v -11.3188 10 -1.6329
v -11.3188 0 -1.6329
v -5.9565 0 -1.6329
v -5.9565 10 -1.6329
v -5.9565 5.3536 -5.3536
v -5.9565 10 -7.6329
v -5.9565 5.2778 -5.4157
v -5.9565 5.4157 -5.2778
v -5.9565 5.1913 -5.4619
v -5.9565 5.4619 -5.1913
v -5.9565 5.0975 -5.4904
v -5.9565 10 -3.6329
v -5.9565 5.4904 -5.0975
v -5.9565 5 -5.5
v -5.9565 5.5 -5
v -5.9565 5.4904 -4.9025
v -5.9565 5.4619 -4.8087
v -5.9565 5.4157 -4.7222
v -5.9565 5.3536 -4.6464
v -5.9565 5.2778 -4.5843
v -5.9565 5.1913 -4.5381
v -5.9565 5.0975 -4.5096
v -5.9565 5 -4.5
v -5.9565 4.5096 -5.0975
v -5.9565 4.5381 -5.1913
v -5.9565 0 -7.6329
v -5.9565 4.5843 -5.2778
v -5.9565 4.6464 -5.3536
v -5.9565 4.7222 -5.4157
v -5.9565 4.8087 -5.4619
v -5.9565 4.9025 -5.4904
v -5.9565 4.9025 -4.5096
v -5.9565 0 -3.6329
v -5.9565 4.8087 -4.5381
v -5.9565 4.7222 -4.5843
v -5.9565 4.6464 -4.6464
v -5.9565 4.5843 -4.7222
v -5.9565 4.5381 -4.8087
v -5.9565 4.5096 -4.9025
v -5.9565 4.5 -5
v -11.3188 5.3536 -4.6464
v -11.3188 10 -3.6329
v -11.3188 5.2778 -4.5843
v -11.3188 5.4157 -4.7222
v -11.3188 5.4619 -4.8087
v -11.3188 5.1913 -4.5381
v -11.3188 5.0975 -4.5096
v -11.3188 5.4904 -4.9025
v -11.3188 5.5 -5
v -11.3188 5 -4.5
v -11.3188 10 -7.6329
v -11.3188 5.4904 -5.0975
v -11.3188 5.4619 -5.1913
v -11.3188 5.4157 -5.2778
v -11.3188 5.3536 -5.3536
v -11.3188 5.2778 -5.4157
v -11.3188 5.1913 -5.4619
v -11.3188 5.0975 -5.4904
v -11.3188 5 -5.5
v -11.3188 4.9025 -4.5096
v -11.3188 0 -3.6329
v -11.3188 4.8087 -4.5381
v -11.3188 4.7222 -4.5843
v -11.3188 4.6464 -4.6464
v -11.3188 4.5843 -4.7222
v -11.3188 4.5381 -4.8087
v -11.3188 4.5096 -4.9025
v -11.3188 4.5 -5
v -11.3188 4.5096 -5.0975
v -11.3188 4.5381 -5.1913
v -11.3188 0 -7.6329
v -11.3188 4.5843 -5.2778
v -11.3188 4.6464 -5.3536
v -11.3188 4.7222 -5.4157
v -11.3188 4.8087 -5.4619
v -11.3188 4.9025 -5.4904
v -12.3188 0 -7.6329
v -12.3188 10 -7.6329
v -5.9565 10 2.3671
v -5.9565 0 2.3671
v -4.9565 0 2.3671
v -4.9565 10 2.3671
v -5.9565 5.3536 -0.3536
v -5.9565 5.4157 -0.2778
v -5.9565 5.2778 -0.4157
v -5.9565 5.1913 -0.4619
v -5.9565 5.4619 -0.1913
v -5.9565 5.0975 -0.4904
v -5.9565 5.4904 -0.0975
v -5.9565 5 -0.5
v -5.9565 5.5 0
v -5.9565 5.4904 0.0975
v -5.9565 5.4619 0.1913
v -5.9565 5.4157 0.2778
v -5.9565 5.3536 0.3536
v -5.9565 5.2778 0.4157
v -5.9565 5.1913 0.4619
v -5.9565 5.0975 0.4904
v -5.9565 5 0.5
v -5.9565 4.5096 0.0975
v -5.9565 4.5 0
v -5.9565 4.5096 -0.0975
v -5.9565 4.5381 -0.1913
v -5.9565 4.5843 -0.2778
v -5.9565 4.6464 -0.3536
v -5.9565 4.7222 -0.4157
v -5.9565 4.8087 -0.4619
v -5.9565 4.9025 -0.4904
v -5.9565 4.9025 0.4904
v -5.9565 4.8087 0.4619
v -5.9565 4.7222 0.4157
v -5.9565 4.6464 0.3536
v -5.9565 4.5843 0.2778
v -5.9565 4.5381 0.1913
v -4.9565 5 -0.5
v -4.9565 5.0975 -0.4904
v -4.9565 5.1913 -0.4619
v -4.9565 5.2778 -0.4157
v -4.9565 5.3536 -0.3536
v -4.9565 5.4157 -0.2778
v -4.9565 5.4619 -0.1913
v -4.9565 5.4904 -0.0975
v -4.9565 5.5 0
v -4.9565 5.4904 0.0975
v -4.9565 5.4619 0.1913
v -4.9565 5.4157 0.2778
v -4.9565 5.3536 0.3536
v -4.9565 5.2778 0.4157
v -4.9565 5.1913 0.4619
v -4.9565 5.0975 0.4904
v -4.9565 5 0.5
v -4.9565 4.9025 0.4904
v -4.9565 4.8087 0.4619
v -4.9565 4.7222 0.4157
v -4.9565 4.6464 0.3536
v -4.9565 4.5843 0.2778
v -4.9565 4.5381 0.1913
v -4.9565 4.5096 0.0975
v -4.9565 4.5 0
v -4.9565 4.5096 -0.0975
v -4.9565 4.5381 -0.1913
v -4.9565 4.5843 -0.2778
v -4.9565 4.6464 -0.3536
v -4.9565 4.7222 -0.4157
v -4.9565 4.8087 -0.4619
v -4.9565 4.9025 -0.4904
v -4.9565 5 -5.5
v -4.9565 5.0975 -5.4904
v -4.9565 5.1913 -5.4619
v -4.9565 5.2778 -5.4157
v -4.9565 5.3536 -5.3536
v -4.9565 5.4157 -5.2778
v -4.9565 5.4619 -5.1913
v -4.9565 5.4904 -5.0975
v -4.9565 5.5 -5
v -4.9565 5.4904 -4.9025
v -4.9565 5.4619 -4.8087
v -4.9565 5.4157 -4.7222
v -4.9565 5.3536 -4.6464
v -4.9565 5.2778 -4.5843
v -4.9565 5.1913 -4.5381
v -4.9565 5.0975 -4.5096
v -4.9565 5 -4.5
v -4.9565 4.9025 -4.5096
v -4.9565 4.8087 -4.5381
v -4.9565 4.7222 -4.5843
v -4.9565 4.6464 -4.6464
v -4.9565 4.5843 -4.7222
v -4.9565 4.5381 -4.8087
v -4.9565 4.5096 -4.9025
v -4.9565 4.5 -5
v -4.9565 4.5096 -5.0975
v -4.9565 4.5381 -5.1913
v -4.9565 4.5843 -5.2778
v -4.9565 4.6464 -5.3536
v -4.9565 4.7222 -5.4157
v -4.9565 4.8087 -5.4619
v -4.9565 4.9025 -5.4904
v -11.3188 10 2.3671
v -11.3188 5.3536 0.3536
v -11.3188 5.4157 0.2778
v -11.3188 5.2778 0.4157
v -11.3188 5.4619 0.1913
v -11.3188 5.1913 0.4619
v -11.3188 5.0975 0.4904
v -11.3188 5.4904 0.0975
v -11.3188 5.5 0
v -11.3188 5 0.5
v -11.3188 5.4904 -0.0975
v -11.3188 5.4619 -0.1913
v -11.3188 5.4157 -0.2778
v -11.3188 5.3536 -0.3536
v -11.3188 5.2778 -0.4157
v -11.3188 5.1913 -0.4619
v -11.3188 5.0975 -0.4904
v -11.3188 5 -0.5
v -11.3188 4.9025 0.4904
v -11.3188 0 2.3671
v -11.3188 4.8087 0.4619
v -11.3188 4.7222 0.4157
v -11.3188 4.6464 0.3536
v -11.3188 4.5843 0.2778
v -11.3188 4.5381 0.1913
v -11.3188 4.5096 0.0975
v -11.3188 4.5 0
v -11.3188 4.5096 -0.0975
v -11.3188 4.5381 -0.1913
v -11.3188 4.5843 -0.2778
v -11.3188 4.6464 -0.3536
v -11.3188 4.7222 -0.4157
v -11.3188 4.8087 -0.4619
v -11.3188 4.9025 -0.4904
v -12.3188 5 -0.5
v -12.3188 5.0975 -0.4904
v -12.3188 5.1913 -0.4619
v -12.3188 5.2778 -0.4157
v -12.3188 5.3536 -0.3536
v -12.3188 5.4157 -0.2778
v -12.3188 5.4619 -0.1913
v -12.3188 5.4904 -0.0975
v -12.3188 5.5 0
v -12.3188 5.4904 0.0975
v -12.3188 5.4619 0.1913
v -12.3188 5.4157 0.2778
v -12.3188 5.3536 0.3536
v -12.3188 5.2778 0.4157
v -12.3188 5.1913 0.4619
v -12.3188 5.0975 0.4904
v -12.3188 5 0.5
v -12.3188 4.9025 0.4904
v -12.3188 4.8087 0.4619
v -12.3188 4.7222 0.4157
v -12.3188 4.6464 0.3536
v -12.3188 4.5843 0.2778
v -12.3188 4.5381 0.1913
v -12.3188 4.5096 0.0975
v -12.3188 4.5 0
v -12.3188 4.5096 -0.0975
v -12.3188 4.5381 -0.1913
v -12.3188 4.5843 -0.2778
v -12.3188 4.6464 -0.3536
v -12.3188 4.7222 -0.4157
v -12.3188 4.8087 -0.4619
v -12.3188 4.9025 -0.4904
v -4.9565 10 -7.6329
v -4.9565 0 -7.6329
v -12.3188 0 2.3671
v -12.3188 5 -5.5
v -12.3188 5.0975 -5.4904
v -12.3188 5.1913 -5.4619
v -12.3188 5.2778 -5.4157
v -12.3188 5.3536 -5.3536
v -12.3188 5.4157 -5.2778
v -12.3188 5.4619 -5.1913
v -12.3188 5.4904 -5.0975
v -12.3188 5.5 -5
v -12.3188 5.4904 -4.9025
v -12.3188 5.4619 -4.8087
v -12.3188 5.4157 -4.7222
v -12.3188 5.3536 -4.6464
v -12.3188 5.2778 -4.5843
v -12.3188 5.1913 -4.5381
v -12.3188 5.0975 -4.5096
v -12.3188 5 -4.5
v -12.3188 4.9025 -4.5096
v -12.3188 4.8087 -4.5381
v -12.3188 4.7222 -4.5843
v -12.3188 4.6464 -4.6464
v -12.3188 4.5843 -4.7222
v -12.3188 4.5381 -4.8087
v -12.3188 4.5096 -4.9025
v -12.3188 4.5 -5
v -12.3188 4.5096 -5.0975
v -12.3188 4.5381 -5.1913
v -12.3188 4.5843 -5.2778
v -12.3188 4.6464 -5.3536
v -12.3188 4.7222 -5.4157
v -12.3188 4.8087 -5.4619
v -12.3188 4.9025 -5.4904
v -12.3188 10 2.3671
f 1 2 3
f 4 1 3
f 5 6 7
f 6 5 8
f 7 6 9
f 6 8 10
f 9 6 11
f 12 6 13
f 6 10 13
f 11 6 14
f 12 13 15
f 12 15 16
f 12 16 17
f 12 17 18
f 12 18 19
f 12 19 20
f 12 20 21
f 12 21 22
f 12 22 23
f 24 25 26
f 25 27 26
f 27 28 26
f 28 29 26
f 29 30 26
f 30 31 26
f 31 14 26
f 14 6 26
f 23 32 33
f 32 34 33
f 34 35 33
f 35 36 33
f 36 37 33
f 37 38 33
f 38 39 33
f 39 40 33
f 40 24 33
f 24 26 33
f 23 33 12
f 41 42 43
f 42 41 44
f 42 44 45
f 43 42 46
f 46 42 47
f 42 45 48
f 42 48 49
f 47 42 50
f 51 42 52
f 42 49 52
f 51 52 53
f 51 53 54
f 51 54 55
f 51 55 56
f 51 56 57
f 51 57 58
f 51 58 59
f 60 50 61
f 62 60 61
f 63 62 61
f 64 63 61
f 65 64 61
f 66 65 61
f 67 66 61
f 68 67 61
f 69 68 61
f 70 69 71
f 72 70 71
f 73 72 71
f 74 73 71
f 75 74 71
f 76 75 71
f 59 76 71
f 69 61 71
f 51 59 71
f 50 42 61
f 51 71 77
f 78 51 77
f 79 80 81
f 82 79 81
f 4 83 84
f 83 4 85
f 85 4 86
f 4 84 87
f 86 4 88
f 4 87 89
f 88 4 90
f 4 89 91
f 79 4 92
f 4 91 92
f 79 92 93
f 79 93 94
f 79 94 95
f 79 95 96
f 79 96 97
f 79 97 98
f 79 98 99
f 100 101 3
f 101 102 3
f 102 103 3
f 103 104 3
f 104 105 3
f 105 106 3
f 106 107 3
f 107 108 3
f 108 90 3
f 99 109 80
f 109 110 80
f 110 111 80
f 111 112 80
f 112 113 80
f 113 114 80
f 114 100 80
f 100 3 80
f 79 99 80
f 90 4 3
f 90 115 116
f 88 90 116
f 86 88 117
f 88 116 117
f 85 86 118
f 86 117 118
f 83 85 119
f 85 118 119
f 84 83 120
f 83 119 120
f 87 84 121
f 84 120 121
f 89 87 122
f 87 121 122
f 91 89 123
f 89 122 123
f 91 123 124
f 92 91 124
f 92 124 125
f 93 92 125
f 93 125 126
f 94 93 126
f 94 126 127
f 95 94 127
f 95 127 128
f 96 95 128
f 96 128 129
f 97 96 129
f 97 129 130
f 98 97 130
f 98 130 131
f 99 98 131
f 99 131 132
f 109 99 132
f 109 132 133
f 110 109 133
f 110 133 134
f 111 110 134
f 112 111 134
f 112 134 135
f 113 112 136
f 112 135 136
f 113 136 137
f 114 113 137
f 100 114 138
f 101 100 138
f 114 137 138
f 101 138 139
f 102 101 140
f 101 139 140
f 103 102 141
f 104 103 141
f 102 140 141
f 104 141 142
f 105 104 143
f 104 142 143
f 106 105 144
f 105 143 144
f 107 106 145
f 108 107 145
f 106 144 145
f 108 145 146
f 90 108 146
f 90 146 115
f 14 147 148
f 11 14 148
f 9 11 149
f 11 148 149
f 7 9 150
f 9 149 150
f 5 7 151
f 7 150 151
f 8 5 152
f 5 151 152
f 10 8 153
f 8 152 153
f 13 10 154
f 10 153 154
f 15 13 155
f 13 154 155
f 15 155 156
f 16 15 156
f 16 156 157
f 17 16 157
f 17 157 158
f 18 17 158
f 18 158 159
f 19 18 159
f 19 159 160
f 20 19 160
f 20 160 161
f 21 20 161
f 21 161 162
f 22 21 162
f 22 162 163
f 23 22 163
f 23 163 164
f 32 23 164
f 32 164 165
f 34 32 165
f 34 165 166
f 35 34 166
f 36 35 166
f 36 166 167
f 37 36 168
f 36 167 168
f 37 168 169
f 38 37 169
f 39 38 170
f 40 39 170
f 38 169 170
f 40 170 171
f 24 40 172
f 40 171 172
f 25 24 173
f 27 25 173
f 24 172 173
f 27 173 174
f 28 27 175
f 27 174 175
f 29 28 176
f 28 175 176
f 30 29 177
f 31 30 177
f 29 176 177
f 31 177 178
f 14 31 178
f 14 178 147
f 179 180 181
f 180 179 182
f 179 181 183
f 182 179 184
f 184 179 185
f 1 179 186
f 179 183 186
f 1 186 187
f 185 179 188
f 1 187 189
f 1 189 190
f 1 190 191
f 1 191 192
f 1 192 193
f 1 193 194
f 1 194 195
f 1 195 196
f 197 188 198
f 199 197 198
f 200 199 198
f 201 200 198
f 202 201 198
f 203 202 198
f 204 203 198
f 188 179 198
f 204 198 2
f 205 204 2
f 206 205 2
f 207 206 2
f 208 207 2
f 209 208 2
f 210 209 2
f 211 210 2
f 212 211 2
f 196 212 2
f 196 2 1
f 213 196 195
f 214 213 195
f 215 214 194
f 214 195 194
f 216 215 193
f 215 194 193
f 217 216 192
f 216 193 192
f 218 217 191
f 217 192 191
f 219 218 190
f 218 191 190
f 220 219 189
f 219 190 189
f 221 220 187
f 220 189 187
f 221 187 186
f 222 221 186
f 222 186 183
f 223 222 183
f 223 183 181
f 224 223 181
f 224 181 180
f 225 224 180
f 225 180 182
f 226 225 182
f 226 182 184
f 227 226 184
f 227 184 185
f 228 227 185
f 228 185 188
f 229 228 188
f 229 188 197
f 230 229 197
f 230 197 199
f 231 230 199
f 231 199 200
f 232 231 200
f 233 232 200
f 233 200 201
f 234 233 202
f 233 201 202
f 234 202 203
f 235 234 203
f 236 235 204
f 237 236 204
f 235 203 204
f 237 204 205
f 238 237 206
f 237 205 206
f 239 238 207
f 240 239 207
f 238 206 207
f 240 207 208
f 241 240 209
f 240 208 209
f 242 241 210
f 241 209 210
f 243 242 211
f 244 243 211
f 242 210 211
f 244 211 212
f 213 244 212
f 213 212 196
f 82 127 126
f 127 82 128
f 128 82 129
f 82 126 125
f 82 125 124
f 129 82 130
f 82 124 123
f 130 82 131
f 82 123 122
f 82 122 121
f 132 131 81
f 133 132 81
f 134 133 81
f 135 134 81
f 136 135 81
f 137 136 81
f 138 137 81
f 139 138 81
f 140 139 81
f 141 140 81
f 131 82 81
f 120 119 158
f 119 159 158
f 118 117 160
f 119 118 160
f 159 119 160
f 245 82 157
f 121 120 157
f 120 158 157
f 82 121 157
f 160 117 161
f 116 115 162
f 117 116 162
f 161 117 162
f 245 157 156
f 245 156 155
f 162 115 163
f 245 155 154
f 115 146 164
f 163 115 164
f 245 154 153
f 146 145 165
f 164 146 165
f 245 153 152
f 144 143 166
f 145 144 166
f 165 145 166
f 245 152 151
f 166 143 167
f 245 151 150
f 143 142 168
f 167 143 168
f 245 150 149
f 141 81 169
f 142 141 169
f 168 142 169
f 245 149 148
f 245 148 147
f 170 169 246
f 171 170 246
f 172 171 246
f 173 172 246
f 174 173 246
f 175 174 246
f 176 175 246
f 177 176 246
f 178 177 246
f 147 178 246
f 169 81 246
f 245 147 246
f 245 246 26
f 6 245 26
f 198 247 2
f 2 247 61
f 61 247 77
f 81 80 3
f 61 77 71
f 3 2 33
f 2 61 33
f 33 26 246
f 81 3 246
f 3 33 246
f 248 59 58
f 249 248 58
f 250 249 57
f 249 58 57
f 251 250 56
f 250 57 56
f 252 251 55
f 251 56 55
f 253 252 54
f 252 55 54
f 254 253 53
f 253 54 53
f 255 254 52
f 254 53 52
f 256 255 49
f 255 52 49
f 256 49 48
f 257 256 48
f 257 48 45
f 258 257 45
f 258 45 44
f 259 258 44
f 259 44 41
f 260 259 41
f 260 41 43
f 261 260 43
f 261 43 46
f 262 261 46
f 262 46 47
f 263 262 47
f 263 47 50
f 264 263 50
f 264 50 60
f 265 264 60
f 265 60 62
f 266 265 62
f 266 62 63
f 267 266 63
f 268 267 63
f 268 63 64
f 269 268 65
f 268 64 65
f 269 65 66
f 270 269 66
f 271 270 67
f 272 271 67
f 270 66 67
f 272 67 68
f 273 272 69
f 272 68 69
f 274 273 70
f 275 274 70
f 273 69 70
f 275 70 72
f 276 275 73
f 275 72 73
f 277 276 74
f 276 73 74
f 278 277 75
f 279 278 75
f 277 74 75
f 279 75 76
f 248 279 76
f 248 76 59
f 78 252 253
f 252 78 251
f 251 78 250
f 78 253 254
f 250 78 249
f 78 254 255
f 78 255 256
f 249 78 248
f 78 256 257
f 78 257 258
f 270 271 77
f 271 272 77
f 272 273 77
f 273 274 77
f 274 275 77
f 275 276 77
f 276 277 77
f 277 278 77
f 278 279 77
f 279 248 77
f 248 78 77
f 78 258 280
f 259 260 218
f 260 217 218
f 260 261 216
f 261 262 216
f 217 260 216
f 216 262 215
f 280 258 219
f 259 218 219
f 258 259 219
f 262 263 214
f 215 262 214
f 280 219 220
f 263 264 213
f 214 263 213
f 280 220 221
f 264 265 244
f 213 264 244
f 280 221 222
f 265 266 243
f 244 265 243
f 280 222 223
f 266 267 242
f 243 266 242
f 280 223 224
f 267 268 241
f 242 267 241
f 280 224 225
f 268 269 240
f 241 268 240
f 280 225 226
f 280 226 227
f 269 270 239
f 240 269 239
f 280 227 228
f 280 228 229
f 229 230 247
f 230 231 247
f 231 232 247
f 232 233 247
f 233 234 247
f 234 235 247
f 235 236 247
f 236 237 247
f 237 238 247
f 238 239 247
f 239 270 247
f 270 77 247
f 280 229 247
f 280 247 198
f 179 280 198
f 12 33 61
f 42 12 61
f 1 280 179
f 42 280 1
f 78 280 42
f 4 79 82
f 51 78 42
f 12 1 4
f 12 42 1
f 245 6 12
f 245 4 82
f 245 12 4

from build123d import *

# Parameters (mm, degrees)
BOSS_EXTRUDE2_DEPTH = 10
SKETCH2_R           = 0.5
CUT_EXTRUDE1_DEPTH  = 15.57614975
LPATTERN1_COUNT     = 2
LPATTERN1_PITCH     = 5


with BuildPart() as part:
    # Sketch1 → Boss-Extrude2 (new body)
    with BuildSketch(Plane(origin=(0, 0, 0), x_dir=(1, 0, 0), z_dir=(0, 1, 0))):
        Polygon((-12.31884058, 7.632850242), (-12.31884058, -2.367149758), (-11.31884058, -2.367149758), (-11.31884058, 1.632850242), (-5.956521739, 1.632850242), (-5.956521739, -2.367149758), (-4.956521739, -2.367149758), (-4.956521739, 7.632850242), (-5.956521739, 7.632850242), (-5.956521739, 3.632850242), (-11.31884058, 3.632850242), (-11.31884058, 7.632850242), align=None)
    extrude(amount=BOSS_EXTRUDE2_DEPTH)

    # Sketch2 → Cut-Extrude1 (cut, through all)
    with BuildSketch(Plane(origin=(-4.956521739, 0, 0), x_dir=(0, 0, -1), z_dir=(1, 0, 0))):
        with Locations((0, 5)):
            Circle(SKETCH2_R)
    cut_extrude1 = extrude(amount=-CUT_EXTRUDE1_DEPTH, mode=Mode.SUBTRACT)

    # LPattern1: Cut-Extrude1 ×2
    with Locations(*[(0, 0, -i * LPATTERN1_PITCH) for i in range(1, LPATTERN1_COUNT)]):
        add(cut_extrude1, mode=Mode.SUBTRACT)


solid = part.part
